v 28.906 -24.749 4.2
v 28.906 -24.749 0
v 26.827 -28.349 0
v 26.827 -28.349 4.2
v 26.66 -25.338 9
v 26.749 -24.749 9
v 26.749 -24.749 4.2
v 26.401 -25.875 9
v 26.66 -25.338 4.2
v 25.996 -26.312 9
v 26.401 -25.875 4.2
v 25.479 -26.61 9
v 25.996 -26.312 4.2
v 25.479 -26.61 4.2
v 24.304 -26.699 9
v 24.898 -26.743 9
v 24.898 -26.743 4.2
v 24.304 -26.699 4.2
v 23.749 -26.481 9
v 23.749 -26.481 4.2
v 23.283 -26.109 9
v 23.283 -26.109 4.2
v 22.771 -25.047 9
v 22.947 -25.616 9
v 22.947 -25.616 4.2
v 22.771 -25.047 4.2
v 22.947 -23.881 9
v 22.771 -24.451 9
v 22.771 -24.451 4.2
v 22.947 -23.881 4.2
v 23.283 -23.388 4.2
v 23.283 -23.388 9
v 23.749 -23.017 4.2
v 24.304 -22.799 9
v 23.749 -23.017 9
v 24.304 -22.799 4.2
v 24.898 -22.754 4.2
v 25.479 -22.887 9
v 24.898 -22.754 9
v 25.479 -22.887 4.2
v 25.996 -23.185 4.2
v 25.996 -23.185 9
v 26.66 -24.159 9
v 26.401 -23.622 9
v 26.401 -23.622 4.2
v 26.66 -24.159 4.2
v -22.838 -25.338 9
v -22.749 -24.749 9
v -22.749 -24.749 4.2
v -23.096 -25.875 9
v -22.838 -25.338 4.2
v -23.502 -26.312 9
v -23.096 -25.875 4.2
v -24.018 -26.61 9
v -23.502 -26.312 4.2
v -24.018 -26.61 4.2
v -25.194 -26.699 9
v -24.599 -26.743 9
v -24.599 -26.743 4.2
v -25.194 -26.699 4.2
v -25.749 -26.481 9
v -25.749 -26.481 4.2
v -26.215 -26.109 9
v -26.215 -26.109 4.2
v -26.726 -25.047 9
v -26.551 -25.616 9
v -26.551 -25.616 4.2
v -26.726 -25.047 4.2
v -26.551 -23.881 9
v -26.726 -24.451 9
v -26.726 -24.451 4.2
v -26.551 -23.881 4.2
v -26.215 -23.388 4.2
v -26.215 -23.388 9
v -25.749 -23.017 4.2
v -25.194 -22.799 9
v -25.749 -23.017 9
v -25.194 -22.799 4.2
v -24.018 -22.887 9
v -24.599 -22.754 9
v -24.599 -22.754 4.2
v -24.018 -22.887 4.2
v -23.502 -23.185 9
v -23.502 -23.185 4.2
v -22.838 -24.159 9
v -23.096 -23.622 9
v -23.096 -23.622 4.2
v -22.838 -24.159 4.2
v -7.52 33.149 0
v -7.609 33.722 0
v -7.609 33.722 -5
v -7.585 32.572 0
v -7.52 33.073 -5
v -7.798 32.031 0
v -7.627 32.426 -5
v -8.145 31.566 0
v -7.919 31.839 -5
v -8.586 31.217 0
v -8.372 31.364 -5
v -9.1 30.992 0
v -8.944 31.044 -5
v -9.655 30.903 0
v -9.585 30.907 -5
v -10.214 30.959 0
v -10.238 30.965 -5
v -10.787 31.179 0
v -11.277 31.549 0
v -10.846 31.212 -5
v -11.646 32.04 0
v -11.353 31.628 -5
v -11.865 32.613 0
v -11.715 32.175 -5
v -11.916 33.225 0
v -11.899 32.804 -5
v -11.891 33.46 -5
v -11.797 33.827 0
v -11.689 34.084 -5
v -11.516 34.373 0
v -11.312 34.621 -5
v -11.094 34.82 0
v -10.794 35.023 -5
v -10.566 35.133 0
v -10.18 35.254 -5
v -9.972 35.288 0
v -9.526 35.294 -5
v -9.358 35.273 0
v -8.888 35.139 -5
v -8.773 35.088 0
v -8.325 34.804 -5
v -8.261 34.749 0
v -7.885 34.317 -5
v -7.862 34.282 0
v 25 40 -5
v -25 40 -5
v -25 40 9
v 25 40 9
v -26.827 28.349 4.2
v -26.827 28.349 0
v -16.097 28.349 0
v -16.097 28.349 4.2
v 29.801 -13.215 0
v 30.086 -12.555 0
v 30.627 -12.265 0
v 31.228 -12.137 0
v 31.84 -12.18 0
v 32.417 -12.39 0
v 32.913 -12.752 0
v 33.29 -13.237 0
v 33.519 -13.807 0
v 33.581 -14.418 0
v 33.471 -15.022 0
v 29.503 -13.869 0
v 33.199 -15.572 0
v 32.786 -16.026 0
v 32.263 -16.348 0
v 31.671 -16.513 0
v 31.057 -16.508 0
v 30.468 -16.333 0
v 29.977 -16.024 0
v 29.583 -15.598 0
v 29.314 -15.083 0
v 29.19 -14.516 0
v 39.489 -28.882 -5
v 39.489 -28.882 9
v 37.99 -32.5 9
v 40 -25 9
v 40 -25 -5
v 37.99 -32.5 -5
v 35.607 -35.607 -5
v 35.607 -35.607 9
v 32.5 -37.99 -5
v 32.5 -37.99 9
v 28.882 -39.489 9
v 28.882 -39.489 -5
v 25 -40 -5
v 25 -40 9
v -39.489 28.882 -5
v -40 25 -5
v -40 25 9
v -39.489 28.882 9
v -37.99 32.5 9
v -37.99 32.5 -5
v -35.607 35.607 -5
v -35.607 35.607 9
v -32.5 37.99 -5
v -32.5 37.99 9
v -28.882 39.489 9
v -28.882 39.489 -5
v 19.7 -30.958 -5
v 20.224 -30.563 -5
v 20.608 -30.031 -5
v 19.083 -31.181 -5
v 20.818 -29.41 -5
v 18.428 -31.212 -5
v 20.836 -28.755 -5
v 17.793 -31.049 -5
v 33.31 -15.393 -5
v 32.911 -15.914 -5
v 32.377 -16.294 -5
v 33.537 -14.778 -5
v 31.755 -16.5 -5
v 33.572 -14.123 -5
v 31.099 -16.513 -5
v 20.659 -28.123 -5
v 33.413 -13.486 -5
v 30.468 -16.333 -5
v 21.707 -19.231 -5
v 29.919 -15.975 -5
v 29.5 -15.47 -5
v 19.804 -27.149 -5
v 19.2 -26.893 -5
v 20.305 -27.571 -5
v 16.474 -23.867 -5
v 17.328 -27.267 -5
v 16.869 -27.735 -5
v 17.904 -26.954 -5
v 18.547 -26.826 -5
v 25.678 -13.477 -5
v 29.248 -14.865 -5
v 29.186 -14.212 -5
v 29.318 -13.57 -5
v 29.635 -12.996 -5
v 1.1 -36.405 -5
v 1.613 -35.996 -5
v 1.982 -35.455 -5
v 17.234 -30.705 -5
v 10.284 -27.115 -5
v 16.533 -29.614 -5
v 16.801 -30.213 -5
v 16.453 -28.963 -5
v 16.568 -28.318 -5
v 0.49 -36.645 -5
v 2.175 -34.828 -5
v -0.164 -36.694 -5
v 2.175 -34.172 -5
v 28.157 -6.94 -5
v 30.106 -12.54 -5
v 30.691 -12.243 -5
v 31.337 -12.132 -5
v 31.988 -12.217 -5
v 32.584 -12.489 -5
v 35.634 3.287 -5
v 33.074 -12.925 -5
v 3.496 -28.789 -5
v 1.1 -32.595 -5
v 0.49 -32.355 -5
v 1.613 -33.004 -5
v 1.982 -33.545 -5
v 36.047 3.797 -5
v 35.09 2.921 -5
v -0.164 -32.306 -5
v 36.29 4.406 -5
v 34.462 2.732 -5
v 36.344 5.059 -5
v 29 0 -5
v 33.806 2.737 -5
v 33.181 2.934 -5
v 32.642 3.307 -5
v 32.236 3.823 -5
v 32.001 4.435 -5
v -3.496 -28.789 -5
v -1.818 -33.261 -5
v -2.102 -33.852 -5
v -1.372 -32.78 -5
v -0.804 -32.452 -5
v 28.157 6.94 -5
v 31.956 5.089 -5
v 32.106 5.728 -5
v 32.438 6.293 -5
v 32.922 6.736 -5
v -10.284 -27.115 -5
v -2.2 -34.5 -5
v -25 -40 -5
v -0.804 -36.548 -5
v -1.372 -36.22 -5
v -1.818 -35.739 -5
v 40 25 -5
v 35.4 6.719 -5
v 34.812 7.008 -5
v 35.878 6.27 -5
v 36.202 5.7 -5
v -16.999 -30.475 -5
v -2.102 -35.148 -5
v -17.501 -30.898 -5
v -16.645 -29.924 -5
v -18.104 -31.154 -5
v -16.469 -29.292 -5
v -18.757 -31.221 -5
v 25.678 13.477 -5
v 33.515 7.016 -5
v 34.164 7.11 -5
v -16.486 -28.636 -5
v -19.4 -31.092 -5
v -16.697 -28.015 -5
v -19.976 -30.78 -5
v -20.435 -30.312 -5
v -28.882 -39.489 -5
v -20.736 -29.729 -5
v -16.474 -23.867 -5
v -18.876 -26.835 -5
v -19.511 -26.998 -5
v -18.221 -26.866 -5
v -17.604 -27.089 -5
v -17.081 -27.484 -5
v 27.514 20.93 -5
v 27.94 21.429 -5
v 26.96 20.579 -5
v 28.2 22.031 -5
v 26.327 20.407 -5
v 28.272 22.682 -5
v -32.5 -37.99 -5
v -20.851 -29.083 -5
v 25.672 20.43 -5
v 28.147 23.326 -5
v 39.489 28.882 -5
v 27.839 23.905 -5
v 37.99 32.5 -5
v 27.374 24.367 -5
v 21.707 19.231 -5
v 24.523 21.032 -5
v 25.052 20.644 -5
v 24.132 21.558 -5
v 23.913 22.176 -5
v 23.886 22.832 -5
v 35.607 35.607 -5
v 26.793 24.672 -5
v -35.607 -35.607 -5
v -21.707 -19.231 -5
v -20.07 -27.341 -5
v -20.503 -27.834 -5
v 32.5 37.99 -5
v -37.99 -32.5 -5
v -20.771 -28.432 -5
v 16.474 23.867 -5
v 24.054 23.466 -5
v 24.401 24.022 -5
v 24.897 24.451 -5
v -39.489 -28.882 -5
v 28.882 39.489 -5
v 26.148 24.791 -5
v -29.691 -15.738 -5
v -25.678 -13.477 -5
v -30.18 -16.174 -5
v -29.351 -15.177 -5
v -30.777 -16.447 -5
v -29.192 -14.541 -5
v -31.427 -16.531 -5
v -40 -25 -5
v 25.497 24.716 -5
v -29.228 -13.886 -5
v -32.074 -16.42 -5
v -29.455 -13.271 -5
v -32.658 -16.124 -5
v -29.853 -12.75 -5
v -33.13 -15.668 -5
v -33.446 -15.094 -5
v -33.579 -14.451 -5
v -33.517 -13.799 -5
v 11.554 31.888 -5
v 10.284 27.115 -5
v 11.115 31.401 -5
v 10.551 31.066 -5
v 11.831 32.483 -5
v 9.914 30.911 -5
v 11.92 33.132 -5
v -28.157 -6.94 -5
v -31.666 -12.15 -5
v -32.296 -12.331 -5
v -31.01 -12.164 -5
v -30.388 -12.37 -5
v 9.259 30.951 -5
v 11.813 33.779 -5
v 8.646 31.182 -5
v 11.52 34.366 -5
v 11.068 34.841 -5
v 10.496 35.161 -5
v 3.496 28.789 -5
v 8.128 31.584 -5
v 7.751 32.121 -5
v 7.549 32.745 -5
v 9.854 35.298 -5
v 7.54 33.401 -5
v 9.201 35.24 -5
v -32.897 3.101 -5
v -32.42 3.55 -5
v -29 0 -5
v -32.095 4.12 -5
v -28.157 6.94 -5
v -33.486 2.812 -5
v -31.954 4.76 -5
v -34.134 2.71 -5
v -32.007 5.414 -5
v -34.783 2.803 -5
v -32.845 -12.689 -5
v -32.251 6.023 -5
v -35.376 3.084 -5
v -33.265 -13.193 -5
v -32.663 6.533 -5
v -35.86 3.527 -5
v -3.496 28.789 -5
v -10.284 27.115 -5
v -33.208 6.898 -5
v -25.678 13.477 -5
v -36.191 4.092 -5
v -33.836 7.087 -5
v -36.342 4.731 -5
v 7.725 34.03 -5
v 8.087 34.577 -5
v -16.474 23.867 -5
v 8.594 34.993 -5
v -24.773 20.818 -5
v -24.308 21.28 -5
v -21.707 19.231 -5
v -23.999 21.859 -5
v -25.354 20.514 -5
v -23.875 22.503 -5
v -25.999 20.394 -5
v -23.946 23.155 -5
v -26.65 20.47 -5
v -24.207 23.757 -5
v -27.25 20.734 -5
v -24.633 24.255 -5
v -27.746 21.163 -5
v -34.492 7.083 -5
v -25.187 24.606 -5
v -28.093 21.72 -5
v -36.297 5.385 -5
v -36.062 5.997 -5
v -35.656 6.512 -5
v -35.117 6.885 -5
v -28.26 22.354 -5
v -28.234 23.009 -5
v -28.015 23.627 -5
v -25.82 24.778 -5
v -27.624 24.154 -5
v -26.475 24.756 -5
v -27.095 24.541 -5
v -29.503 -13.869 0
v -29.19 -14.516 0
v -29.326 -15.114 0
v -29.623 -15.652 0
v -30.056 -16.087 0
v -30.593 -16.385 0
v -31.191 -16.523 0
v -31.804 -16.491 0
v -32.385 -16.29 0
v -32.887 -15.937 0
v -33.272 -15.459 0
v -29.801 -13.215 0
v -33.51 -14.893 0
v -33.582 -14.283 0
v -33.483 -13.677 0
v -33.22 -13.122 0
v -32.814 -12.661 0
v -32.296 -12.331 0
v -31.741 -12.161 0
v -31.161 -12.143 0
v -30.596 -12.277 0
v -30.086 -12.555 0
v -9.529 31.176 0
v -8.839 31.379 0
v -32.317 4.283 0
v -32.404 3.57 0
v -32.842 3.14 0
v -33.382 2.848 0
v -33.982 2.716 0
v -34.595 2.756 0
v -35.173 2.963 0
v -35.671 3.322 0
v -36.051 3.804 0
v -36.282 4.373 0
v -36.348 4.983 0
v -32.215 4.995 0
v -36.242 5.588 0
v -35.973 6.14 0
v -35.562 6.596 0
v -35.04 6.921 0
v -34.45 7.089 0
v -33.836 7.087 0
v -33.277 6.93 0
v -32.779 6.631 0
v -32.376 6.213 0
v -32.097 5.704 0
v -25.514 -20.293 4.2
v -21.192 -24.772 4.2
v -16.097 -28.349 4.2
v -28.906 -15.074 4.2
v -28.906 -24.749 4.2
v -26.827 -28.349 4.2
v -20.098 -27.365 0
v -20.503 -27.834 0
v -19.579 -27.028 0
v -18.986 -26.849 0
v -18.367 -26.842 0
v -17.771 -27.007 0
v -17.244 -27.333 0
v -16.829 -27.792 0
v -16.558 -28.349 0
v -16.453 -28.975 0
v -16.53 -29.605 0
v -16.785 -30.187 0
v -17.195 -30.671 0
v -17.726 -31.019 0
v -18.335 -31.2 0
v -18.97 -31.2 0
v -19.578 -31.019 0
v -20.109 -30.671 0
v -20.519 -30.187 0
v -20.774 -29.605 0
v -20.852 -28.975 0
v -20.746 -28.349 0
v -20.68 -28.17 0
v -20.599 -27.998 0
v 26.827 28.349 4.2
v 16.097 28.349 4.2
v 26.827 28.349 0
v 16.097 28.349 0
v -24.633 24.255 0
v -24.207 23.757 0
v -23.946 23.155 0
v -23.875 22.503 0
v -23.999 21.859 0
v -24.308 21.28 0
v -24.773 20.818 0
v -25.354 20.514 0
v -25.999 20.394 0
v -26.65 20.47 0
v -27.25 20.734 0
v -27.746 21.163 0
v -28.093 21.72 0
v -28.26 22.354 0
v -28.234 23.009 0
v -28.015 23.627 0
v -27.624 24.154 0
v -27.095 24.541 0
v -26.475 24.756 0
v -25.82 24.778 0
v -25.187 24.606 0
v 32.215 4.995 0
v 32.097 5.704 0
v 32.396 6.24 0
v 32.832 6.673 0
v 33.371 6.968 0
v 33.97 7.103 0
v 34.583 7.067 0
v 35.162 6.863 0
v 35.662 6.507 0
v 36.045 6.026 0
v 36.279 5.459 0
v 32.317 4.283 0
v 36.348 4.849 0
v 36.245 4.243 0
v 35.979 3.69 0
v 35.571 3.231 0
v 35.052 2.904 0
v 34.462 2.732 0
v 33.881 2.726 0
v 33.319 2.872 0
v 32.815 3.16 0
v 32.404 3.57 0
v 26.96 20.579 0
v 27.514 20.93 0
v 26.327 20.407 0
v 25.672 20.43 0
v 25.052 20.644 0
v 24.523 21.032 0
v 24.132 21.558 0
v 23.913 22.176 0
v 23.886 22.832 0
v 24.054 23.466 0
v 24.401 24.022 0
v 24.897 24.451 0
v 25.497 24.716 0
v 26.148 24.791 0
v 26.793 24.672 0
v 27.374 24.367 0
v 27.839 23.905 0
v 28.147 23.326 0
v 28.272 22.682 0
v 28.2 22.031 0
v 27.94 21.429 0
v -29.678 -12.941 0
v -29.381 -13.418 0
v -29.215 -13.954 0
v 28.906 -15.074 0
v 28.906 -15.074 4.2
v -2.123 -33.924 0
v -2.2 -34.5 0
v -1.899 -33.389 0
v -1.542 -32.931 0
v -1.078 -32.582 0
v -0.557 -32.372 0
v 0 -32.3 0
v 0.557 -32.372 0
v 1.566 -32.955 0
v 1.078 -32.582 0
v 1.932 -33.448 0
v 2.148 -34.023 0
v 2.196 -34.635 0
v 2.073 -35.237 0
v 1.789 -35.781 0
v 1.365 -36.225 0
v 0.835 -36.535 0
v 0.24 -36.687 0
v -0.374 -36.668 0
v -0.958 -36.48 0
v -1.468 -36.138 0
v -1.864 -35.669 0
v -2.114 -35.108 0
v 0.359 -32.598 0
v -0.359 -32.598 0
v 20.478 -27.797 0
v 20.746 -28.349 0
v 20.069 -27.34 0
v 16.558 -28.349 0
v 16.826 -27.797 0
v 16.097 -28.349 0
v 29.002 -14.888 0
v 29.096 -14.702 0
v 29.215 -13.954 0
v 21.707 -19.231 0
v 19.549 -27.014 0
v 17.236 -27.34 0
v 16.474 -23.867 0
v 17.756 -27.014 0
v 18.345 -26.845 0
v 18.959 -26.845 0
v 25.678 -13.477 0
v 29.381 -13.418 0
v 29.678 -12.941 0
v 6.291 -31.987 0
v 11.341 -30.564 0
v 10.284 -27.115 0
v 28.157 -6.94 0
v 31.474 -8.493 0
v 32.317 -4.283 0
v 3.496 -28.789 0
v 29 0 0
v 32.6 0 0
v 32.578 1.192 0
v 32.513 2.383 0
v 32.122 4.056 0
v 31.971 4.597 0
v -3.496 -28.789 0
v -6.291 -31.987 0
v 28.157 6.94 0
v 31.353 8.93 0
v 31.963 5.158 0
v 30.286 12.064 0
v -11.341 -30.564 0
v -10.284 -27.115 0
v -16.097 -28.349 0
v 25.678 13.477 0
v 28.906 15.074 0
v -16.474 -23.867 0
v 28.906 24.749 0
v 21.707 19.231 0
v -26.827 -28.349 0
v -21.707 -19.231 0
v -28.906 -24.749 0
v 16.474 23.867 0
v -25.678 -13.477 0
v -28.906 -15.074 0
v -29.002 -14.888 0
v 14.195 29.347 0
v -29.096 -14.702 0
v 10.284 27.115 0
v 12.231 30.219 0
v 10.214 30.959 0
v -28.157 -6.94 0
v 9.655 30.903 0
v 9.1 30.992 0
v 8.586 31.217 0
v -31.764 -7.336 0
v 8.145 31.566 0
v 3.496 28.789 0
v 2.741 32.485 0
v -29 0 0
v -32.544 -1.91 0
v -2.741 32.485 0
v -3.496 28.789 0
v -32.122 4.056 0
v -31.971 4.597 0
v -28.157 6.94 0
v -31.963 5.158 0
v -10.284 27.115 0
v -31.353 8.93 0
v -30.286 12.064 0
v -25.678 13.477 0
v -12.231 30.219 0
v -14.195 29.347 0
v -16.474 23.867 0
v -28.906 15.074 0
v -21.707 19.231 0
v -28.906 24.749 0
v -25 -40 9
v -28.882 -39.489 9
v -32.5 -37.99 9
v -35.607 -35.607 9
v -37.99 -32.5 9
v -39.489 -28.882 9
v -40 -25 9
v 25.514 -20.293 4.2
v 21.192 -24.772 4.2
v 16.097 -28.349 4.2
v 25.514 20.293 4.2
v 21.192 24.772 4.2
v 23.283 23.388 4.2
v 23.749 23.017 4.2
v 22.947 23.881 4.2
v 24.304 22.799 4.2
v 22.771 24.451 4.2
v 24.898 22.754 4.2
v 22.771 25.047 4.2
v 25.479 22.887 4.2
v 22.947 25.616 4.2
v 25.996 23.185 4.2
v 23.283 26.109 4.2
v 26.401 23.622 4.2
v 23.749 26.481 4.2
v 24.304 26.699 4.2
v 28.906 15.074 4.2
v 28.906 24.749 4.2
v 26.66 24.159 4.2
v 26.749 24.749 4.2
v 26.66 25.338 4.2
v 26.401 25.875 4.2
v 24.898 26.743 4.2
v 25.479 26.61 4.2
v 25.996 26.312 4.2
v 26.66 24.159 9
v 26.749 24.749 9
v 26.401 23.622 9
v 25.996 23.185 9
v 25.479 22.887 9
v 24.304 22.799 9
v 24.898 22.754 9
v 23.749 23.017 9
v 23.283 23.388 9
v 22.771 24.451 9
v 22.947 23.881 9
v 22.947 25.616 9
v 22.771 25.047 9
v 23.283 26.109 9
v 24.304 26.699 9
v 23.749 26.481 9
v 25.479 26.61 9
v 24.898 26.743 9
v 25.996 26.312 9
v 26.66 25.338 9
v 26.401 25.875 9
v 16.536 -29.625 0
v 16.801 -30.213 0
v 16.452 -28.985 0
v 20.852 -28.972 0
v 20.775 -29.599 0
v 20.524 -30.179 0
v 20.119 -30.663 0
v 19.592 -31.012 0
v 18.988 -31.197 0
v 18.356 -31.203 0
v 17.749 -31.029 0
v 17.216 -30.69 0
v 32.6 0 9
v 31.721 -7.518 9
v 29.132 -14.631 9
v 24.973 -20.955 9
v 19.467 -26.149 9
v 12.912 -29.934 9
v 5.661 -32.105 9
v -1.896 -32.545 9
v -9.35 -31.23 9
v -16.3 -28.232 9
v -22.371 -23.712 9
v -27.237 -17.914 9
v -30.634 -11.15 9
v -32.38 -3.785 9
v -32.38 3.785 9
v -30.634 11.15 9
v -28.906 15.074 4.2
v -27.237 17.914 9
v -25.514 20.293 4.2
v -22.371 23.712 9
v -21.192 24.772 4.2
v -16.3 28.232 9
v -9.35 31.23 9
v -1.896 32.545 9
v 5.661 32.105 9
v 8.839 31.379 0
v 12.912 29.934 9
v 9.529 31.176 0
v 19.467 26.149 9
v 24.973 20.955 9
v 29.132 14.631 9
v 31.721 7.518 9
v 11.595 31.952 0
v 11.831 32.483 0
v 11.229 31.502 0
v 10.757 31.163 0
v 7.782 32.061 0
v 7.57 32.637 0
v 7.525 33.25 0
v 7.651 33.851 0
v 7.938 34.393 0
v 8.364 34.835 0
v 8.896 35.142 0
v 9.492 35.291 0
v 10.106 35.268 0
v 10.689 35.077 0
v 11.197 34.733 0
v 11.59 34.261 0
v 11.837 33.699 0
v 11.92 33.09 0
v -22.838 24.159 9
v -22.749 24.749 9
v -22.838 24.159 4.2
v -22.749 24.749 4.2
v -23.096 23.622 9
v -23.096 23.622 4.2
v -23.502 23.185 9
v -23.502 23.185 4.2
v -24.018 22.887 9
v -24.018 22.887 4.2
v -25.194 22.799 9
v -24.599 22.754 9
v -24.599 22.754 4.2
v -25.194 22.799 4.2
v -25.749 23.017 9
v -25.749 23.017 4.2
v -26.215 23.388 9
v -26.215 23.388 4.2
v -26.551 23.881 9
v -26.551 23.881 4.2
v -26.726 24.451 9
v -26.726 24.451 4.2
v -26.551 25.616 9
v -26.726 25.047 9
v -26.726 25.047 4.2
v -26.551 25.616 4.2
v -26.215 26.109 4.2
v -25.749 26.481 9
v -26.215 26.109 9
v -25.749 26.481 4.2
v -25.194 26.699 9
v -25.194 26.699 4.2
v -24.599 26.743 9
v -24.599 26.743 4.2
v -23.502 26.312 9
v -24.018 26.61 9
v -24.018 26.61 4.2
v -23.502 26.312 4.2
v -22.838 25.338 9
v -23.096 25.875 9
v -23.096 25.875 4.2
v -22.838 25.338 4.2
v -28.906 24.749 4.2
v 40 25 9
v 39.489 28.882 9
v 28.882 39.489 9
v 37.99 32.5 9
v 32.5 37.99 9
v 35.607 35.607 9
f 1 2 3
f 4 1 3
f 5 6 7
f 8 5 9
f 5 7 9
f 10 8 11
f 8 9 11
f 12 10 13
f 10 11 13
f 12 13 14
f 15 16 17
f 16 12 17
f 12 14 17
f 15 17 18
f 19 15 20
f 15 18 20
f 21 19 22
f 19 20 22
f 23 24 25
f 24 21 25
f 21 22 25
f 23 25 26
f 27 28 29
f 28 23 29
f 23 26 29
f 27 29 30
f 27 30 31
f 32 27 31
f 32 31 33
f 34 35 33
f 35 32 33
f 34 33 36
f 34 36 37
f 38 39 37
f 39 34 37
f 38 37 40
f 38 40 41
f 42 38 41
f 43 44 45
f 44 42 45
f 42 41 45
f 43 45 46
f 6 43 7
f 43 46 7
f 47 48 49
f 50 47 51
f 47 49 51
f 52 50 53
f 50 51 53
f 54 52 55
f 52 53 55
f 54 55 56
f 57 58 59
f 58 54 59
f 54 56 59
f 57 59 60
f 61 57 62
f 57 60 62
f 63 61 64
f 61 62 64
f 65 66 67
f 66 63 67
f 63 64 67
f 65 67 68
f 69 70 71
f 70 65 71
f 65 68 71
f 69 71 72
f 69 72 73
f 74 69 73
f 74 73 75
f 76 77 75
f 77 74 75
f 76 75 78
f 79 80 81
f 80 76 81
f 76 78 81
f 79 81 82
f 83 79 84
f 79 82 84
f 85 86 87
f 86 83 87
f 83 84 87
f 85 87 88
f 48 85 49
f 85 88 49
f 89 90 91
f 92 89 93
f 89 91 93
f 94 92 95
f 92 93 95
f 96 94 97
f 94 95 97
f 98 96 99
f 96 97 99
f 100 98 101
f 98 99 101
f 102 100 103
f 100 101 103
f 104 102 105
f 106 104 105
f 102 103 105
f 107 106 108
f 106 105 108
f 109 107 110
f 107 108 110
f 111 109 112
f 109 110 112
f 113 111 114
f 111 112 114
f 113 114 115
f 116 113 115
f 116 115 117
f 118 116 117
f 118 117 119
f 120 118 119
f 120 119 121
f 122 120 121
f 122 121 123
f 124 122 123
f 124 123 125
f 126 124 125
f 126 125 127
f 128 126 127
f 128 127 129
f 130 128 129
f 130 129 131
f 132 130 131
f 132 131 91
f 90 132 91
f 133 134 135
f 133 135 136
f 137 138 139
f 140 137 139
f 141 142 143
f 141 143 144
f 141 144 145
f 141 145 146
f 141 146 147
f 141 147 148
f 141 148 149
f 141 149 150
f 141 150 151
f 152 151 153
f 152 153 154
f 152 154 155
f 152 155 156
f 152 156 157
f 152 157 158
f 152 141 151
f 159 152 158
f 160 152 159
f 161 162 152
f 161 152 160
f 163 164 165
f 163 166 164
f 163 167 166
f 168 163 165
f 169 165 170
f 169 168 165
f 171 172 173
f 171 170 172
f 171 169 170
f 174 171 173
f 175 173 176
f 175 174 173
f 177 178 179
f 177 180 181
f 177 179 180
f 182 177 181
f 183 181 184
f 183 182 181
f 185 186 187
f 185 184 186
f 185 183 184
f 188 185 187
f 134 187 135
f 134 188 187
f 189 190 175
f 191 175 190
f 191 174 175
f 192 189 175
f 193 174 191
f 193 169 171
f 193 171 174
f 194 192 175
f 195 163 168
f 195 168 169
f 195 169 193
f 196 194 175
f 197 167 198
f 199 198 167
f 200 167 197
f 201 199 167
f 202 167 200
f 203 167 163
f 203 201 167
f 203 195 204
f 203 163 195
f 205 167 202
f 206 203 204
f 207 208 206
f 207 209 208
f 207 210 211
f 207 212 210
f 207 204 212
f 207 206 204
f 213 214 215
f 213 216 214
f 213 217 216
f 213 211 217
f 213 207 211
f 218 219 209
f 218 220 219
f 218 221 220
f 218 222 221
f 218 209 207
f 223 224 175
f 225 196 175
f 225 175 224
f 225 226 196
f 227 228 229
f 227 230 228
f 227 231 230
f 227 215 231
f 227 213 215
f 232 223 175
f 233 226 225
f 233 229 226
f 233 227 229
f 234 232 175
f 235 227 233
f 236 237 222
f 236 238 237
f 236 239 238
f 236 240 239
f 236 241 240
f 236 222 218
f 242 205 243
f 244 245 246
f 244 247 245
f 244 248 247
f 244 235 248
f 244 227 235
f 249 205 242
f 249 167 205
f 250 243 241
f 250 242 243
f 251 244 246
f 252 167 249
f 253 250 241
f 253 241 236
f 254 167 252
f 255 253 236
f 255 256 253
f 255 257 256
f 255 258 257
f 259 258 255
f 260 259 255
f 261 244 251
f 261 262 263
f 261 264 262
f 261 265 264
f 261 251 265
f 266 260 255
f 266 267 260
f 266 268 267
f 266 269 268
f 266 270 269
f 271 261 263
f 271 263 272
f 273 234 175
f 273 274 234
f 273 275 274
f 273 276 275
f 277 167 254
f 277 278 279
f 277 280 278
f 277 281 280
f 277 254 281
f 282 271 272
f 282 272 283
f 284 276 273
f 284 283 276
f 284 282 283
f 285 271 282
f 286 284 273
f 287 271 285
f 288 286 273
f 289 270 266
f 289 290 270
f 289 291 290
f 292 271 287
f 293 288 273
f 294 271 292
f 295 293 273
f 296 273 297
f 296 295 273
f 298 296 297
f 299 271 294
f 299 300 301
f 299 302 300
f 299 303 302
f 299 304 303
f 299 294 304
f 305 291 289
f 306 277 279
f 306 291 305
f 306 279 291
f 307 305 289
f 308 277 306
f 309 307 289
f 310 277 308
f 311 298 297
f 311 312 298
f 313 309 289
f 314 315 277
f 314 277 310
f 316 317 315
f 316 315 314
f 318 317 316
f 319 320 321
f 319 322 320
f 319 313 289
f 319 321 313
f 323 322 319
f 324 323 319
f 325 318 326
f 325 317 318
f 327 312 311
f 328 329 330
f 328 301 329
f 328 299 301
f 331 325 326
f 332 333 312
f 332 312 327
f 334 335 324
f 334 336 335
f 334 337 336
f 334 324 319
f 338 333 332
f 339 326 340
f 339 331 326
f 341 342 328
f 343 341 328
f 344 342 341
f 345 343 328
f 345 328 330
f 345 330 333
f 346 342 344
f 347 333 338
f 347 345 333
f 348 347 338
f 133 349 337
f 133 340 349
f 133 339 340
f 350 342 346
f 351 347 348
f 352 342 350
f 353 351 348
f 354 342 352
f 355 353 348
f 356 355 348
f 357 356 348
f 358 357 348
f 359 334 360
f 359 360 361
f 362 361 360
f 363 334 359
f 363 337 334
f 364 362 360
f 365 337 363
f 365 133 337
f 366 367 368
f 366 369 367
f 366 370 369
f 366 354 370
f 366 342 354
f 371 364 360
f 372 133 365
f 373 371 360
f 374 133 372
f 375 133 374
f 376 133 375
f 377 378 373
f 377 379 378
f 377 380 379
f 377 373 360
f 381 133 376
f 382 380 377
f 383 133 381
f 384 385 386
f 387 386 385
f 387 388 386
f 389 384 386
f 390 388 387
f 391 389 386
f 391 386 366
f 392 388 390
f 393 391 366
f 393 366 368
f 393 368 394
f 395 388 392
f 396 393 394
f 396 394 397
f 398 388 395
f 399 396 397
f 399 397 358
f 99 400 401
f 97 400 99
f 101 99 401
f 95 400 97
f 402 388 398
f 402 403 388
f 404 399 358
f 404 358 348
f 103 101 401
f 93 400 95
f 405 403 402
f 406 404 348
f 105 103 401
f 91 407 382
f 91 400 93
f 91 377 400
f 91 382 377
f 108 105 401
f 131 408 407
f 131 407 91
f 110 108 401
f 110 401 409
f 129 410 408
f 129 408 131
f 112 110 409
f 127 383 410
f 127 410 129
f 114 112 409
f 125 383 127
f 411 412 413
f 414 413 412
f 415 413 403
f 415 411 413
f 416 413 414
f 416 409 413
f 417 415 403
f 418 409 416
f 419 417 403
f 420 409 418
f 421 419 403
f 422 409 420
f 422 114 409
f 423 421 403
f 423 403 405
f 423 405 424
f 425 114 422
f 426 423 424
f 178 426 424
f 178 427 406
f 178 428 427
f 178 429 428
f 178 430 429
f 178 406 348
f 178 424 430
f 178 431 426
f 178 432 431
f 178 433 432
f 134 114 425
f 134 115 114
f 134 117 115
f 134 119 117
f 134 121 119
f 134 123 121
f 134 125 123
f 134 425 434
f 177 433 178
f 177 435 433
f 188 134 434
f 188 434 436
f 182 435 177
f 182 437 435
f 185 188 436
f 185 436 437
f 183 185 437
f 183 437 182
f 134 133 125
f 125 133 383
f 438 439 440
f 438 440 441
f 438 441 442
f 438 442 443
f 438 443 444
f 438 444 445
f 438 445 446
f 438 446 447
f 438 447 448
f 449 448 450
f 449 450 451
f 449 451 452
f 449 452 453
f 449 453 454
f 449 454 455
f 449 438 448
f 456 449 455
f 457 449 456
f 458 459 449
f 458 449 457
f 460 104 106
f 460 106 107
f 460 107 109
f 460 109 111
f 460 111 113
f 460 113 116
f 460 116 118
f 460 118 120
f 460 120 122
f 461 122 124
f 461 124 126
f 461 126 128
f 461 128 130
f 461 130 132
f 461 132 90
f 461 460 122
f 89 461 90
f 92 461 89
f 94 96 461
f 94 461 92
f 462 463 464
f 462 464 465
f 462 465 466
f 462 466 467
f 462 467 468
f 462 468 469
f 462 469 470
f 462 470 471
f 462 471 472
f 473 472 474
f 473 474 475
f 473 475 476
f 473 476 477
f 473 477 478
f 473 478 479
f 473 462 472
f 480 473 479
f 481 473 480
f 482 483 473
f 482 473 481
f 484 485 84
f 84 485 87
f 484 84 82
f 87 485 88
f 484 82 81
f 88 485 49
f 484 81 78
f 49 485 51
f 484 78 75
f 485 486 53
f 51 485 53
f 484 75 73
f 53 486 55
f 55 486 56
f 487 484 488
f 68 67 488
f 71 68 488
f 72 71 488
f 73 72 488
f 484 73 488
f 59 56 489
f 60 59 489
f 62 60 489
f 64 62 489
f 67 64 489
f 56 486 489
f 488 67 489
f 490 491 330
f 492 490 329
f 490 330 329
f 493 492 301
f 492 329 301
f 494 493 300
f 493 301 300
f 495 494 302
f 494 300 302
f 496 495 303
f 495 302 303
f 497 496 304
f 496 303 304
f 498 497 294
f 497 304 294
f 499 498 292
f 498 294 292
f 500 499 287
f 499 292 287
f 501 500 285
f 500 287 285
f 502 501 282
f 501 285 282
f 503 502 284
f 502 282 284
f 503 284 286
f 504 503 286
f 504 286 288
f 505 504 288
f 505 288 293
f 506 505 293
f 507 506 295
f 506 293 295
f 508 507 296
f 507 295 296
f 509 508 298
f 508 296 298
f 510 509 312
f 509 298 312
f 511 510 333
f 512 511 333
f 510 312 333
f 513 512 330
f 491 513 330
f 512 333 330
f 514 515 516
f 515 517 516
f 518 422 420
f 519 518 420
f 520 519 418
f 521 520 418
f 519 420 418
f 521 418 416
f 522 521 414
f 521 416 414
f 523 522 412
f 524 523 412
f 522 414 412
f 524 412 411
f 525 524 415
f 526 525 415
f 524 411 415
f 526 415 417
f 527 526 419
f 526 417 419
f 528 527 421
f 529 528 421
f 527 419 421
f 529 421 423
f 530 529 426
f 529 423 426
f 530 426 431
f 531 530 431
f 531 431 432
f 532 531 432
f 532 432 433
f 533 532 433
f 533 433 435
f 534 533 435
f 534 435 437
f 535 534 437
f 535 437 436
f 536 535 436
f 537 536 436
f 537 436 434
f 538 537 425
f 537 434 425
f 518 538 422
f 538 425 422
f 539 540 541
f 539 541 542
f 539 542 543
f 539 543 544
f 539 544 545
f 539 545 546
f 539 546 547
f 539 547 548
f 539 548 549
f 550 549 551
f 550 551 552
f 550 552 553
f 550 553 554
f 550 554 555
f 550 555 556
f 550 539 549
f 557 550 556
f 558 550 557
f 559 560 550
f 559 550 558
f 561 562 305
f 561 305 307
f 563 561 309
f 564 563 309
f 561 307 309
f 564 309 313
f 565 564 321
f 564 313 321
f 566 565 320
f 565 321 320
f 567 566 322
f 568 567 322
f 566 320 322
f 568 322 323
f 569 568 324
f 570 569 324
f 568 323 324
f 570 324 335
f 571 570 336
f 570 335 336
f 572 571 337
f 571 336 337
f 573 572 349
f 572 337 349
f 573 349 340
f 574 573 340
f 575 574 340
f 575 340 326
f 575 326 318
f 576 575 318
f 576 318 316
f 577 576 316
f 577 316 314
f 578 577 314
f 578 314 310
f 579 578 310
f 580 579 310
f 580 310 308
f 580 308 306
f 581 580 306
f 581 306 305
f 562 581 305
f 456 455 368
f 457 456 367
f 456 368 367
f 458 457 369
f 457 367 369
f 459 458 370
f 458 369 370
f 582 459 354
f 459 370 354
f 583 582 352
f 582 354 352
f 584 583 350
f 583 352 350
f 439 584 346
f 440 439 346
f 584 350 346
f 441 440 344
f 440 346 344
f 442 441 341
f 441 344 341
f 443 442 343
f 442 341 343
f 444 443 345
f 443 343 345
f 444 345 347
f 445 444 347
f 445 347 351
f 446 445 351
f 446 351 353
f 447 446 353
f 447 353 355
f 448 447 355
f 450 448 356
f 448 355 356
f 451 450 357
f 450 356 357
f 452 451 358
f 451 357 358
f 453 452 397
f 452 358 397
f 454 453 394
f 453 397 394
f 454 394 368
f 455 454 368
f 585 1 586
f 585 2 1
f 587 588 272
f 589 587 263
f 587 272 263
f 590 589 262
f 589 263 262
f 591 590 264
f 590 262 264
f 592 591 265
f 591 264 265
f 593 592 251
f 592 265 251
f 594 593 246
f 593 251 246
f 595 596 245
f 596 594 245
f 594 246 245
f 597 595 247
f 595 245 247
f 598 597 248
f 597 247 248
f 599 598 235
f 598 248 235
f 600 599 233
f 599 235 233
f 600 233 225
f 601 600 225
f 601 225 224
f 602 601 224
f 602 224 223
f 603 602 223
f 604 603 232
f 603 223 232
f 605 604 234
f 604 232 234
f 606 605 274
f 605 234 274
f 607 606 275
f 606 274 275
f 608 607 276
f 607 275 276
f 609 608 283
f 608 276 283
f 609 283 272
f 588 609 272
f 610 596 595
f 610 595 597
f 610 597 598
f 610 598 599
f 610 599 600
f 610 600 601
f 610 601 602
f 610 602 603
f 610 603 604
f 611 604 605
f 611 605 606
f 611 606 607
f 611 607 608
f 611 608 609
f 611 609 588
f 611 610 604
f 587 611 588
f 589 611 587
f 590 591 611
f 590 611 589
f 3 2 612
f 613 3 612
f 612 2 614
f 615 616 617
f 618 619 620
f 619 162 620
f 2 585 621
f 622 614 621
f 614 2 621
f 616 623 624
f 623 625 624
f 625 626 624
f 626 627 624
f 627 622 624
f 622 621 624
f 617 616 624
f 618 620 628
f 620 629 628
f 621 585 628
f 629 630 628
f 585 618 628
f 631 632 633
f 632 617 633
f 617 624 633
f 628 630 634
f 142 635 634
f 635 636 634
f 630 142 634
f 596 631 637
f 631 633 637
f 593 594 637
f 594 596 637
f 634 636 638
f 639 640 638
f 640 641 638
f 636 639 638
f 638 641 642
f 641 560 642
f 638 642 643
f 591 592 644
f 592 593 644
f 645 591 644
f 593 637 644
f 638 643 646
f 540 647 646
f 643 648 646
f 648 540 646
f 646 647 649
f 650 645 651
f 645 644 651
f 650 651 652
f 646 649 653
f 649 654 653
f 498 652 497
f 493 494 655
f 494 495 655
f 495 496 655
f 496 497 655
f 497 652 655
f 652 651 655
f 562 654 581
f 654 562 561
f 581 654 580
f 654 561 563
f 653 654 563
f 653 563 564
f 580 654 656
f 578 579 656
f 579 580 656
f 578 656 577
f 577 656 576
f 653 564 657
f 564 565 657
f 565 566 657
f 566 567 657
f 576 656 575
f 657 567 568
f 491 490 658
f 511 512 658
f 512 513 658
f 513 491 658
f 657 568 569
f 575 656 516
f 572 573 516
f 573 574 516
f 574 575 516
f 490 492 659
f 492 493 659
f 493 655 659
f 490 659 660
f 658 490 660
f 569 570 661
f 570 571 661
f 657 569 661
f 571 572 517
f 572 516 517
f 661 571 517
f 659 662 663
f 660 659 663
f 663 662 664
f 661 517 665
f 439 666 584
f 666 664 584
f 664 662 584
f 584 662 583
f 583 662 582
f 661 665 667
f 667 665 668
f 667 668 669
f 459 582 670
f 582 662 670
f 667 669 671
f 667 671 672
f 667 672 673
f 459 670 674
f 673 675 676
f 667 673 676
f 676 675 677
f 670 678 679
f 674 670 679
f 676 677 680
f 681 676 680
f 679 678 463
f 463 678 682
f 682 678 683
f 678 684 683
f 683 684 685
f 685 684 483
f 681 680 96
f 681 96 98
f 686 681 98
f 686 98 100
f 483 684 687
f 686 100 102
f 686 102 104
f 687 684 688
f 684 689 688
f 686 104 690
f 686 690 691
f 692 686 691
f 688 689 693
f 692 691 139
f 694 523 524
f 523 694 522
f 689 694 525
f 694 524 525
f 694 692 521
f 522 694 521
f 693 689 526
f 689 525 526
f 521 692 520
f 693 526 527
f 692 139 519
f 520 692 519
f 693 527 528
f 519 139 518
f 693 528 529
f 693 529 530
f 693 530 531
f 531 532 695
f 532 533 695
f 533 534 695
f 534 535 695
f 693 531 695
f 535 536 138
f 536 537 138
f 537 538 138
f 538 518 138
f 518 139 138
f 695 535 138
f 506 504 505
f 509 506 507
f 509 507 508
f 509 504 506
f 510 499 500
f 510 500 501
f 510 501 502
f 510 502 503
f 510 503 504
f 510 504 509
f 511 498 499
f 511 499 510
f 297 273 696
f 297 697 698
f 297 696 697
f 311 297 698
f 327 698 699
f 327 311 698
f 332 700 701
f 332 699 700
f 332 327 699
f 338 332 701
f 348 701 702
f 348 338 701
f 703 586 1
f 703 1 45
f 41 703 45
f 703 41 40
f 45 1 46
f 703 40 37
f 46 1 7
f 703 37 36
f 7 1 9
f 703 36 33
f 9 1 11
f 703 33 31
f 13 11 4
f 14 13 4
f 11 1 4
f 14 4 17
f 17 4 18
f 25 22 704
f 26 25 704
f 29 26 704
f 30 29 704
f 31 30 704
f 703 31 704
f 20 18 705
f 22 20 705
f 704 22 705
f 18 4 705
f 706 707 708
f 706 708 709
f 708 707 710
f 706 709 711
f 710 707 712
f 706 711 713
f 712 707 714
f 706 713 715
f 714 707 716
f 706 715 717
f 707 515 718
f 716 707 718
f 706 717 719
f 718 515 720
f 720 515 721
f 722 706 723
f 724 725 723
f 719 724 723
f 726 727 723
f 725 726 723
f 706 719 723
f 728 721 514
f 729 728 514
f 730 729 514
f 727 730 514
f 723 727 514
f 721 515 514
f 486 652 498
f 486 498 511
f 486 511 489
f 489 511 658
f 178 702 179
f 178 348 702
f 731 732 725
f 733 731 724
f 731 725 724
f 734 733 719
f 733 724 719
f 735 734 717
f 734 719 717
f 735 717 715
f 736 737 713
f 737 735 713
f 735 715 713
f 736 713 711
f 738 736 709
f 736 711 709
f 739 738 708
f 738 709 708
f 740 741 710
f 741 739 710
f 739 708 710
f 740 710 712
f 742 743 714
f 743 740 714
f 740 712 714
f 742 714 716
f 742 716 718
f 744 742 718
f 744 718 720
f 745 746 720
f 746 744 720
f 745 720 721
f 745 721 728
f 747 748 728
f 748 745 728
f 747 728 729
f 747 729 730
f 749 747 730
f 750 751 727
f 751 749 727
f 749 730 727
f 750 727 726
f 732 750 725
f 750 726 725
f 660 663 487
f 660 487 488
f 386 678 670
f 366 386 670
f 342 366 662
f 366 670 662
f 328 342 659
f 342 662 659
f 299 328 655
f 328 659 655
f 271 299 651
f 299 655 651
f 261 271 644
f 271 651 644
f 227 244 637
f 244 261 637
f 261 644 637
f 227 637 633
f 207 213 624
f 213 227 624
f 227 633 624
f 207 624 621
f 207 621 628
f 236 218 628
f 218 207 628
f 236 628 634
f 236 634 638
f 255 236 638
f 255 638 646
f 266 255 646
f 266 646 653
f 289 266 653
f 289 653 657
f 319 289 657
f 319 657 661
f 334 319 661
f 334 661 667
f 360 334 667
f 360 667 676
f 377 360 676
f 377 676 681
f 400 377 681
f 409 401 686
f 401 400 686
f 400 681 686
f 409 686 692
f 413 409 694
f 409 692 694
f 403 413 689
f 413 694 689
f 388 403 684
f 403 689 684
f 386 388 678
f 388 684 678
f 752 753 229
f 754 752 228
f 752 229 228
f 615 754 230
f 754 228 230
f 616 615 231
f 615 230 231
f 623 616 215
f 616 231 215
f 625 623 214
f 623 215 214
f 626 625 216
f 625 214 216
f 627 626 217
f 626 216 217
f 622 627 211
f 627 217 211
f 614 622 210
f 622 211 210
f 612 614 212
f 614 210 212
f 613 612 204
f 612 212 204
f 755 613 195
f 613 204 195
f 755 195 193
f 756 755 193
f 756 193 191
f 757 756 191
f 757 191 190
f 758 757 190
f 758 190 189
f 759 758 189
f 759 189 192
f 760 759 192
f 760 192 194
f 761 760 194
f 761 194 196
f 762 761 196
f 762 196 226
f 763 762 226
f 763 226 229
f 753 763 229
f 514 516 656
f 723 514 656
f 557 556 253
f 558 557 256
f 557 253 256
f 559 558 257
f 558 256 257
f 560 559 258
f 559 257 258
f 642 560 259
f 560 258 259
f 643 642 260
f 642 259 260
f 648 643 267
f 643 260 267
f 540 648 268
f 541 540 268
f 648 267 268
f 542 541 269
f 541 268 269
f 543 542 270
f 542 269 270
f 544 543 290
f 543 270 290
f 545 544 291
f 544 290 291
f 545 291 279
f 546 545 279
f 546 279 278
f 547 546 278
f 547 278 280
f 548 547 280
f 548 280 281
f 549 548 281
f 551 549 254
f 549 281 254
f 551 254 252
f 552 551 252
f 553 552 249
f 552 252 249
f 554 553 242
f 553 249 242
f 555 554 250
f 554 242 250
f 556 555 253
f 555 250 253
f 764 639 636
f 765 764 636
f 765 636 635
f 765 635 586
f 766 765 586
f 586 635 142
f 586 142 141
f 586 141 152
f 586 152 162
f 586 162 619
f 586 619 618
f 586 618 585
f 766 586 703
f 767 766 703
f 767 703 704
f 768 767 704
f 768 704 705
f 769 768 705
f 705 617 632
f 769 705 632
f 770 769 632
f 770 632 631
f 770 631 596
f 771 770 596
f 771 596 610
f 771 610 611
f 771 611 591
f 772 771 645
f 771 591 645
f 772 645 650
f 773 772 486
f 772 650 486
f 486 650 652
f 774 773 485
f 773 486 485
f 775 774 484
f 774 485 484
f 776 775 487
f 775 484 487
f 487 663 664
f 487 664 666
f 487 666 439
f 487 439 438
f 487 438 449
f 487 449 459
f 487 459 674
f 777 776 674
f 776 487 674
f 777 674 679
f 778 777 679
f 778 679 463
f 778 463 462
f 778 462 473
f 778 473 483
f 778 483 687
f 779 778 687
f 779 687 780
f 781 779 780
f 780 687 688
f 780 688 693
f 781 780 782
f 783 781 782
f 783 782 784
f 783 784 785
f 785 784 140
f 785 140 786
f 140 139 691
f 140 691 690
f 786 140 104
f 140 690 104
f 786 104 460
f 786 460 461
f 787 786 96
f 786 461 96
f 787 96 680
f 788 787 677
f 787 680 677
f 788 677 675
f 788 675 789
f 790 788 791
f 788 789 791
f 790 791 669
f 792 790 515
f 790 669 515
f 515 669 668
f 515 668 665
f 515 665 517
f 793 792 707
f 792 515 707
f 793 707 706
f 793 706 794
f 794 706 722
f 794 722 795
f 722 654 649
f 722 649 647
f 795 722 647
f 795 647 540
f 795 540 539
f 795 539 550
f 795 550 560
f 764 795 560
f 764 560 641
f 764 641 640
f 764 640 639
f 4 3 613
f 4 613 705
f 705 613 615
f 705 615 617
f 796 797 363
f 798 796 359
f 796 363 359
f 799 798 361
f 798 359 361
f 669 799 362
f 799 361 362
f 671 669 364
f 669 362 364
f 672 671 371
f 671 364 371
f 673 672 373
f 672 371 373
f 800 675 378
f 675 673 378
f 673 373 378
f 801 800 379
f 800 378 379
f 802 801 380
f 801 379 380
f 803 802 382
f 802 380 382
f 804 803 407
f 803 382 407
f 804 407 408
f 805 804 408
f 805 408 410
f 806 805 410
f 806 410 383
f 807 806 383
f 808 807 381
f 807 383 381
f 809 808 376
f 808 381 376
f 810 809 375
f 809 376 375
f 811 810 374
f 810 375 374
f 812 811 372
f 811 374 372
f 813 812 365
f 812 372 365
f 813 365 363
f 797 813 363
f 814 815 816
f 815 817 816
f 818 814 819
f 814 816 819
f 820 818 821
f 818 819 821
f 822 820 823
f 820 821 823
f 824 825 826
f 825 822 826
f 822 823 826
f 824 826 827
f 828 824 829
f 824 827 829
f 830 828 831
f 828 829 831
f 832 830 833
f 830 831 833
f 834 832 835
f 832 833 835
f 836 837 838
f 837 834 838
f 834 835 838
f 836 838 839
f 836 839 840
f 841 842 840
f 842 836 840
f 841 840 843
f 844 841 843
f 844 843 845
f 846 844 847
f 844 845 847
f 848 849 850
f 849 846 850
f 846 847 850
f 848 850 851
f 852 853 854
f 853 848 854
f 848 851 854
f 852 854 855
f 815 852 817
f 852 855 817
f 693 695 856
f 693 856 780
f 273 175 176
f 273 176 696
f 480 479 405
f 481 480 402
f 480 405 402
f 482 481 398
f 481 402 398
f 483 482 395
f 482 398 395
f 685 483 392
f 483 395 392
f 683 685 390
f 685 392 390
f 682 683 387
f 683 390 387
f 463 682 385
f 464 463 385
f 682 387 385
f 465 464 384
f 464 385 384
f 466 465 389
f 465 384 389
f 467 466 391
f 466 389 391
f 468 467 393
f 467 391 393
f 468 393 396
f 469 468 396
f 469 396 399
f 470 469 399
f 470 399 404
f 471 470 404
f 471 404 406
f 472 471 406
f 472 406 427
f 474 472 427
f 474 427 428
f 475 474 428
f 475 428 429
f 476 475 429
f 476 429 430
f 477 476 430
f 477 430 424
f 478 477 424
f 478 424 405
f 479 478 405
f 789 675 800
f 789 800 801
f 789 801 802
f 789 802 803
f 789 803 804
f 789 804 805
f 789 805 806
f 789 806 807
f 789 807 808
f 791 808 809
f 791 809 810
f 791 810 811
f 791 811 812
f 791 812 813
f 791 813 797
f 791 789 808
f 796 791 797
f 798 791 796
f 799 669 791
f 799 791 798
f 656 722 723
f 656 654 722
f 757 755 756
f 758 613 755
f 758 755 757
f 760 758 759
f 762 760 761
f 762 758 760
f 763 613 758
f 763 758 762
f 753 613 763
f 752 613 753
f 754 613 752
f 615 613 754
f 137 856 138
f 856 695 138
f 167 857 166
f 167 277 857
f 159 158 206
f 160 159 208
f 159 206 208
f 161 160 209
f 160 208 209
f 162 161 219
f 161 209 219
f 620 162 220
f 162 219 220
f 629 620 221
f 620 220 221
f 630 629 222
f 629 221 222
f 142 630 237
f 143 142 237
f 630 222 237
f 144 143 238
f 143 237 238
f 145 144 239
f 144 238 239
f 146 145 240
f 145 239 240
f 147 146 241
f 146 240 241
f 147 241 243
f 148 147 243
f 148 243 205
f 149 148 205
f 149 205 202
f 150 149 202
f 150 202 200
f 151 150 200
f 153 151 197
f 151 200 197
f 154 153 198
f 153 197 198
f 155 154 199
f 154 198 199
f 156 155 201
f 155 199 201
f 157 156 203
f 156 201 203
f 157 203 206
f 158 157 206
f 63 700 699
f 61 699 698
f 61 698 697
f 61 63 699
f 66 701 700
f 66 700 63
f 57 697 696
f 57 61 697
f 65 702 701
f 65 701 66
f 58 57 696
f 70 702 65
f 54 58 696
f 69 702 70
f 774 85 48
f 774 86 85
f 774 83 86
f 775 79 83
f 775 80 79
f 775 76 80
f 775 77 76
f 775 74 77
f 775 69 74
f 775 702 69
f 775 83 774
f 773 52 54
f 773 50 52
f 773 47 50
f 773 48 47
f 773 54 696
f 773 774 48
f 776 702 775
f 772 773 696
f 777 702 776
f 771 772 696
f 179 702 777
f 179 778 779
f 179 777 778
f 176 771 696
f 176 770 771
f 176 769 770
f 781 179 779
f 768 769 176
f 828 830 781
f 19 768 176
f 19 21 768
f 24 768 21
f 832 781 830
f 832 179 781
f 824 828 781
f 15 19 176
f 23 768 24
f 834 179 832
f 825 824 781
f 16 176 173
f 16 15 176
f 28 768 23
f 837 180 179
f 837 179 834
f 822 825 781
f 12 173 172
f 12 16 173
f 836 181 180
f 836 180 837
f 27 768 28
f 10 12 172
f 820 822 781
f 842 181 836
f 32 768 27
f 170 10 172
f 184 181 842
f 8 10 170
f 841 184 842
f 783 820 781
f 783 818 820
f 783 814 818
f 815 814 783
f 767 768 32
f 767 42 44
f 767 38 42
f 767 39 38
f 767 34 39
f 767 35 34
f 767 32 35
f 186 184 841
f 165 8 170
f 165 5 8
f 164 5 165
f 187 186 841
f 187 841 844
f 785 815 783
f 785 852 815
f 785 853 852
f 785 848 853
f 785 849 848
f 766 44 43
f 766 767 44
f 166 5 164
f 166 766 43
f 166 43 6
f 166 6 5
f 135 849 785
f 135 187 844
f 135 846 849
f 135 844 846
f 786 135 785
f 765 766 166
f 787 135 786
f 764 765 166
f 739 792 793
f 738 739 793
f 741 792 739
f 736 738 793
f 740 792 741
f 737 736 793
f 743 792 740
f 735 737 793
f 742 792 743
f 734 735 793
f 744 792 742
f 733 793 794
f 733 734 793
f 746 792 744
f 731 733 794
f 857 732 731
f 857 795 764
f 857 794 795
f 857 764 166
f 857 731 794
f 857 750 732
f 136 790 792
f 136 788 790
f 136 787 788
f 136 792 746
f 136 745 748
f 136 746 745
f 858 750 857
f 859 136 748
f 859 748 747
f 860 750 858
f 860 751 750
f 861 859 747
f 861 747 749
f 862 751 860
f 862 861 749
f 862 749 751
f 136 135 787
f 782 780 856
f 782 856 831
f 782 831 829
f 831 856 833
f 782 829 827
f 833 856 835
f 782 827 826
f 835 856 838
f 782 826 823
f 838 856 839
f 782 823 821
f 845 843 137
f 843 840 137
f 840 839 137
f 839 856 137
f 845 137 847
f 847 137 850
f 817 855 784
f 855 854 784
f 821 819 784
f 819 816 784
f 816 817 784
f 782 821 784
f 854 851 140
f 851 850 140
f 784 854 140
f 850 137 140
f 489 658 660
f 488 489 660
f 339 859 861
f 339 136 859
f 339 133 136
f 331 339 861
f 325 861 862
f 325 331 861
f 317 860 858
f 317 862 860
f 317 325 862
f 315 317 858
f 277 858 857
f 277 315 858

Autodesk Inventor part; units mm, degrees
ref_plane "YZ Plane" through (0, 0, 0) normal (1, 0, 0) x (0, 1, 0)
ref_plane "XZ Plane" through (0, 0, 0) normal (0, 1, 0) x (-1, 0, 0)
ref_plane "XY Plane" through (0, 0, 0) normal (0, 0, 1) x (1, 0, 0)
sketch "스케치1" plane through (0, 0, 0) normal (0, 0, 1) x (1, 0, 0)
  line L0 (-25, -30) -> (25, -30) construction
  line L1 (30, -25) -> (30, 25) construction
  line L2 (25, 30) -> (-25, 30) construction
  line L3 (-30, 25) -> (-30, -25) construction
  line L4 (-30, -30) -> (30, 30) construction
  line L5 (30, -30) -> (-30, 30) construction
  arc A0 (-25, 30) -> (-30, 25) centre (-25, 25) ccw
  arc A1 (30, 25) -> (25, 30) centre (25, 25) ccw
  arc A2 (25, -30) -> (30, -25) centre (25, -25) ccw
  arc A3 (-30, -25) -> (-25, -30) centre (-25, -25) ccw
  circle A4 centre (0, 0) radius 7.5
  circle A5 centre (0, 0) radius 35 construction
  circle A6 centre (-24.7487, 24.7487) radius 2
  circle A7 centre (-24.7487, -24.7487) radius 2
  circle A8 centre (24.7487, -24.7487) radius 2
  circle A9 centre (24.7487, 24.7487) radius 2
  circle A10 centre (0, 0) radius 32.6
  circle A11 centre (0, 0) radius 25 construction
  line L6 (-25, 40) -> (25, 40)
  arc A12 (40, 25) -> (25, 40) centre (25, 25) ccw
  line L7 (40, 25) -> (40, -25)
  arc A13 (25, -40) -> (40, -25) centre (25, -25) ccw
  line L8 (25, -40) -> (-25, -40)
  arc A14 (-40, -25) -> (-25, -40) centre (-25, -25) ccw
  line L9 (-40, -25) -> (-40, 25)
  arc A15 (-25, 40) -> (-40, 25) centre (-25, 25) ccw
  dimension "d4" = 70
  dimension "d0" = 60
  dimension "d1" = 60
  dimension "d2" = 5
  dimension "d3" = 15
  dimension "d5" = 4
  dimension "d8" = 360
  dimension "d10" = 65.2
  dimension "d11" = 50
  dimension "d12" = 10
extrude "돌출1" add sketch "스케치1" along normal blind 9 contours L6 A12 L7 A13 L8 A14 L9 A15
sketch "스케치2" plane through (0, 0, 0) normal (0, 0, -1) x (-1, 0, 0)
  line L0 (25, -40) -> (-25, -40) projected
  arc A0 (25, -40) -> (40, -25) centre (25, -25) ccw projected
  line L1 (40, 25) -> (40, -25) projected
  arc A1 (40, 25) -> (25, 40) centre (25, 25) ccw projected
  line L2 (-25, 40) -> (25, 40) projected
  arc A2 (-25, 40) -> (-40, 25) centre (-25, 25) ccw projected
  line L3 (-40, -25) -> (-40, 25) projected
  arc A3 (-40, -25) -> (-25, -40) centre (-25, -25) ccw projected
  circle A4 centre (0, 0) radius 32.6 construction
  circle A5 centre (-24.7487, 24.7487) radius 2 projected
  circle A6 centre (-24.7487, -24.7487) radius 2 projected
  circle A7 centre (24.7487, -24.7487) radius 2 projected
  circle A8 centre (24.7487, 24.7487) radius 2 projected
  circle A9 centre (0, 0) radius 29
  dimension "d15" = 58
extrude "돌출2" add sketch "스케치2" along normal blind 5 contours L0 A3 L3 A2 L2 A1 L1 A0 | A5 | A6 | A7 | A8
sketch "스케치9" plane through (0, 0, 0) normal (0, 0, 1) x (1, 0, 0)
  circle A0 centre (-24.7487, 24.7487) radius 2 projected
  line L0 (-28.9057, 24.7487) -> (-26.8272, 28.3487)
  line L1 (-26.8272, 28.3487) -> (-22.6703, 28.3487)
  line L2 (-22.6703, 28.3487) -> (-20.5918, 24.7487)
  line L3 (-20.5918, 24.7487) -> (-22.6703, 21.1487)
  line L4 (-22.6703, 21.1487) -> (-26.8272, 21.1487)
  line L5 (-26.8272, 21.1487) -> (-28.9057, 24.7487)
  line L6 (-28.9057, 24.7487) -> (-28.9057, 15.0739)
  circle A1 centre (0, 0) radius 32.6 projected
  line L7 (-22.6703, 28.3487) -> (-16.0969, 28.3487)
  point P0 (-20.7972, 25.1045)
  point P1 (-24.8091, 21.1487)
  dimension "d27" = 7.2
extrude "돌출4" cut sketch "스케치9" along normal blind 4.2 contours L0 L1 L2 A1 L4 L5 | L5 L4 A1 L6 | L7 A1 L2 | A1 L2 L3 L4 picked at (-21.824, 23.2537)
mirror "미러1" about plane through (0, 0, 0) normal (0, 1, 0) of "돌출4"
mirror "미러2" about plane through (0, 0, 0) normal (1, 0, 0) of "돌출4", "미러1"
sketch "스케치10" plane through (0, 0, -5) normal (0, 0, -1) x (-1, 0, 0)
  circle A0 centre (0, 0) radius 32.5 construction
  circle A1 centre (0, -34.5) radius 2 construction
  circle A2 centre (0, -34.5) radius 2.2
  dimension "d30" = 65
  dimension "d31" = 4
  dimension "d32" = 0.2
extrude "돌출5" cut sketch "스케치10" against normal blind 5
pattern_circular "원형 패턴1" count 11 over 360 about axis through (0, 0, 0) along (0, 0, -1) of "돌출5"
properties part number "사이클로이드 기어 하우징"
